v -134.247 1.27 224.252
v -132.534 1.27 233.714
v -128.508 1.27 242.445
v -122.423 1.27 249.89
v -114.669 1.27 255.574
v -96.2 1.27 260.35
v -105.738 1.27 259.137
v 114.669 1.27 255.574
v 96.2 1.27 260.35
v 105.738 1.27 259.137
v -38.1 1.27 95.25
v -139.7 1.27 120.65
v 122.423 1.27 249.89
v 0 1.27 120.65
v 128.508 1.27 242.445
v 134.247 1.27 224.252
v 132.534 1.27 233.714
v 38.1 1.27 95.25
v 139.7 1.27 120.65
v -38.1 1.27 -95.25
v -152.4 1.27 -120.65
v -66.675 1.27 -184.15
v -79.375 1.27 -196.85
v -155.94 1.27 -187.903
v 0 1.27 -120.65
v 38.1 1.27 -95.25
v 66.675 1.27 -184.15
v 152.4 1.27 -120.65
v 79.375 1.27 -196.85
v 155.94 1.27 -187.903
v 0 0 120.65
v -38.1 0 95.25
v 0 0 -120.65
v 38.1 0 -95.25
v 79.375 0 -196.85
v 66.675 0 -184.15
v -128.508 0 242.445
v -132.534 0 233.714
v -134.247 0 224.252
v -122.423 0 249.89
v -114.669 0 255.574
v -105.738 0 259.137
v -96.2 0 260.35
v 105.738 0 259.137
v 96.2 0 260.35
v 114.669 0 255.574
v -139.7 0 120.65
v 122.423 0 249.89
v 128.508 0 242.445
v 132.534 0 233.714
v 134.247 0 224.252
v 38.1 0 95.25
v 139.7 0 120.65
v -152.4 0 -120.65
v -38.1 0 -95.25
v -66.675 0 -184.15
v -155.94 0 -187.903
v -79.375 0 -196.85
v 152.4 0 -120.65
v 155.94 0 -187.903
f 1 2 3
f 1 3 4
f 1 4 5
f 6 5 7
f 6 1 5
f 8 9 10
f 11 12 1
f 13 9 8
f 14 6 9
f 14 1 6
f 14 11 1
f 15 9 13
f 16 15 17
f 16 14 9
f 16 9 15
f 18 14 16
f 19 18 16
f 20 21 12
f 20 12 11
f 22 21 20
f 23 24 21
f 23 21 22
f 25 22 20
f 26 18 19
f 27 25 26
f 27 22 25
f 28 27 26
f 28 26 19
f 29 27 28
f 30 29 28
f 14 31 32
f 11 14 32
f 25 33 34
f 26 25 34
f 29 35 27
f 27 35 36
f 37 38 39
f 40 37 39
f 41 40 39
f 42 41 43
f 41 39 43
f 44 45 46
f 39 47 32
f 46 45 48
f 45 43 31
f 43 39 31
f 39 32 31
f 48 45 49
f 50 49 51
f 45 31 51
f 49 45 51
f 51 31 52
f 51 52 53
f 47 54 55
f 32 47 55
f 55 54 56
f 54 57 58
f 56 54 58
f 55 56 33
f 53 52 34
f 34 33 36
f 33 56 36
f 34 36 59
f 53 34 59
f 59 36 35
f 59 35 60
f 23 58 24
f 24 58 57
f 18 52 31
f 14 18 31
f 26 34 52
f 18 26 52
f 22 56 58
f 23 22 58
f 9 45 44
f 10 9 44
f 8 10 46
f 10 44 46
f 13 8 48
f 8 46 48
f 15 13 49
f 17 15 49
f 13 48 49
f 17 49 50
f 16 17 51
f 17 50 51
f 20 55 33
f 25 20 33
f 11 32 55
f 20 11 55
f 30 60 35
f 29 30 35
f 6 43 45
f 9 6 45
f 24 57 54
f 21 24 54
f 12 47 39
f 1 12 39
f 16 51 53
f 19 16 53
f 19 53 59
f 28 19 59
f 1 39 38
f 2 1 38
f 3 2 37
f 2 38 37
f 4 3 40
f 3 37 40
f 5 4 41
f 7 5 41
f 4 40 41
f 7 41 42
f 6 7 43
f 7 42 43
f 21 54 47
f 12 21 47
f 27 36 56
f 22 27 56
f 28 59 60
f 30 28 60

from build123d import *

# Parameters (mm, degrees)
BOSS_EXTRUDE1_DEPTH = 1.27


with BuildPart() as part:
    # Sketch1 → Boss-Extrude1 (new body)
    with BuildSketch(Plane(origin=(0, 0, 0), x_dir=(1, 0, 0), z_dir=(0, 1, 0))):
        with BuildLine():
            Line((-152.4, 120.65), (-139.7, -120.65))
            Line((-139.7, -120.65), (-134.247237287, -224.252491542))
            ThreePointArc((-134.247237287, -224.252491542), (-122.423123118, -249.88969001), (-96.19989799, -260.35))
            Line((-96.19989799, -260.35), (0, -260.35))
            Line((0, -260.35), (96.19989799, -260.35))
            ThreePointArc((96.19989799, -260.35), (122.423123118, -249.88969001), (134.247237287, -224.252491542))
            Line((134.247237287, -224.252491542), (139.7, -120.65))
            Line((139.7, -120.65), (152.4, 120.65))
            Line((152.4, 120.65), (155.939618828, 187.902757734))
            Line((155.939618828, 187.902757734), (79.375, 196.85))
            Line((79.375, 196.85), (66.675, 184.15))
            Line((66.675, 184.15), (0, 184.15))
            Line((0, 184.15), (-66.675, 184.15))
            Line((-66.675, 184.15), (-79.375, 196.85))
            Line((-79.375, 196.85), (-155.939618828, 187.902757734))
            Line((-155.939618828, 187.902757734), (-152.4, 120.65))
        make_face()
        Polygon((-38.1, 95.25), (0, 120.65), (38.1, 95.25), (38.1, -95.25), (0, -120.65), (-38.1, -95.25), align=None, mode=Mode.SUBTRACT)
    extrude(amount=BOSS_EXTRUDE1_DEPTH)


solid = part.part
